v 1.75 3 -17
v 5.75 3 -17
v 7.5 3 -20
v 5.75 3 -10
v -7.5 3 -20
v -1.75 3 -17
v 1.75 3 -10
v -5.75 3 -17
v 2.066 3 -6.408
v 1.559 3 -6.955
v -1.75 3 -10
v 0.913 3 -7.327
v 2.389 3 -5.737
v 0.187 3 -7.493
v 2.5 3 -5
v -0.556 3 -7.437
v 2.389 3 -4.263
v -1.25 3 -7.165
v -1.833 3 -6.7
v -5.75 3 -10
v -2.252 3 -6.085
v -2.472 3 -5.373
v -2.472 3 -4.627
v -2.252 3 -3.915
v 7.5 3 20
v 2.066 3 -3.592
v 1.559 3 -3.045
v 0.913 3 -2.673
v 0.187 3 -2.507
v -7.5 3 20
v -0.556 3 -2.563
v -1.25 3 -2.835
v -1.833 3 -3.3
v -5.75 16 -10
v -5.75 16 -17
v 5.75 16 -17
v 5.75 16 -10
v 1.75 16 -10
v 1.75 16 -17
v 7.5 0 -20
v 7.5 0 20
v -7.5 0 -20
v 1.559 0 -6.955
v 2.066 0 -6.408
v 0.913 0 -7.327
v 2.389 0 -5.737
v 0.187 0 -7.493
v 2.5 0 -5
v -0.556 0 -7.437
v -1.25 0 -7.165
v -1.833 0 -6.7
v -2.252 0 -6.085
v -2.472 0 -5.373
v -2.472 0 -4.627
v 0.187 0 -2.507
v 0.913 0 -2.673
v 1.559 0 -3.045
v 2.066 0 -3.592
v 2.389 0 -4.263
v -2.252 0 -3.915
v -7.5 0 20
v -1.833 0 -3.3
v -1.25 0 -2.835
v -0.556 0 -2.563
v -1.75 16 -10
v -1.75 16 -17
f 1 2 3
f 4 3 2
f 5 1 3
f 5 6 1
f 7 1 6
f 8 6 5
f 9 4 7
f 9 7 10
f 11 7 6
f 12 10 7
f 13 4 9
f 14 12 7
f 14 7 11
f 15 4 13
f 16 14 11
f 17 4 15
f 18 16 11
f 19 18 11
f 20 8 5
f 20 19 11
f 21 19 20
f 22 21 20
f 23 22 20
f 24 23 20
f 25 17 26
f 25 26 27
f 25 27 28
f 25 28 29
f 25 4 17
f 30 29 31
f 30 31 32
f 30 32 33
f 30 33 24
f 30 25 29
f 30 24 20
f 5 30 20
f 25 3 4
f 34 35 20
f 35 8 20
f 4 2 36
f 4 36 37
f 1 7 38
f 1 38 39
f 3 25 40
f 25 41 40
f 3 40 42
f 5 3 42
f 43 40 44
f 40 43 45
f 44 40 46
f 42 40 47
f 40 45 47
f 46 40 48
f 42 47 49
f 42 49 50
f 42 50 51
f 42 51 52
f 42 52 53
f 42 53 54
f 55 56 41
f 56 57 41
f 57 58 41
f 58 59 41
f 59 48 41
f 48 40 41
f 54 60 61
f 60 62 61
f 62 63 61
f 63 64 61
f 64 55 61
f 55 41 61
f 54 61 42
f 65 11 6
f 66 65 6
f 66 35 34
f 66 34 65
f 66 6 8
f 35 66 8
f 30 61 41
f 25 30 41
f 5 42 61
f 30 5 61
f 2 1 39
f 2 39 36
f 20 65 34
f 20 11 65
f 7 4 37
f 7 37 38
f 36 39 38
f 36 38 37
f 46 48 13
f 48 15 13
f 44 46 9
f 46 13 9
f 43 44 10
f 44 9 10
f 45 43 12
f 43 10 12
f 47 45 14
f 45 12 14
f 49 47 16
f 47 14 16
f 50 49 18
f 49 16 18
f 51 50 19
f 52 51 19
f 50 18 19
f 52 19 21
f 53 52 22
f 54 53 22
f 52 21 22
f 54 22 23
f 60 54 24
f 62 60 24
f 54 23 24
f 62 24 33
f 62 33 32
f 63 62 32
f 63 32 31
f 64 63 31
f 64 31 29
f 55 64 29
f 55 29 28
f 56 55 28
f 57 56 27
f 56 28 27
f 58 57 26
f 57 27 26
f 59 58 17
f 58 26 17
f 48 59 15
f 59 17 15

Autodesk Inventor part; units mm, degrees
ref_plane "YZ Plane" through (0, 0, 0) normal (1, 0, 0) x (0, 1, 0)
ref_plane "XZ Plane" through (0, 0, 0) normal (0, 1, 0) x (-1, 0, 0)
ref_plane "XY Plane" through (0, 0, 0) normal (0, 0, 1) x (1, 0, 0)
sketch "Sketch1" plane through (0, 0, 0) normal (0, 1, 0) x (-1, 0, 0)
  line L0 (7.5, 20) -> (-7.5, 20)
  line L1 (-7.5, 20) -> (-7.5, -20)
  line L2 (-7.5, -20) -> (7.5, -20)
  line L3 (7.5, -20) -> (7.5, 20)
  line L4 (7.5, 20) -> (-7.5, -20) construction
  line L5 (-7.5, 20) -> (7.5, -20) construction
  point P0 (0, 0)
  dimension "d0" = 15
  dimension "d1" = 40
extrude "Extrusion1" add sketch "Sketch1" along normal blind 3
sketch "Sketch2" plane through (0, 3, 0) normal (0, 1, 0) x (1, 0, 0)
  line L0 (0, 0) -> (0, 5)
  circle A0 centre (0, 5) radius 2.5
  line L1 (0, 5) -> (0, 10)
  line L2 (0, 10) -> (-3.75, 10)
  line L3 (-3.75, 10) -> (-3.75, 13.5)
  line L4 (-5.75, 10) -> (-1.75, 10)
  line L5 (-1.75, 10) -> (-1.75, 17)
  line L6 (-1.75, 17) -> (-5.75, 17)
  line L7 (-5.75, 17) -> (-5.75, 10)
  line L8 (-5.75, 10) -> (-1.75, 17) construction
  line L9 (-1.75, 10) -> (-5.75, 17) construction
  line L10 (3.75, 10) -> (3.75, 13.5)
  line L11 (5.75, 10) -> (1.75, 10)
  line L12 (1.75, 10) -> (1.75, 17)
  line L13 (1.75, 17) -> (5.75, 17)
  line L14 (5.75, 17) -> (5.75, 10)
  line L15 (5.75, 10) -> (1.75, 17) construction
  line L16 (1.75, 10) -> (5.75, 17) construction
  dimension "d4" = 5
  dimension "d5" = 5
  dimension "d6" = 5
  dimension "d7" = 3.75
  dimension "d8" = 3.5
  dimension "d9" = 4
  dimension "d10" = 7
extrude "Extrusion2" add sketch "Sketch2" along normal blind 13 contours L2 L4 L7 L6 L5 | L11 L12 L13 L14
extrude "Extrusion3" cut sketch "Sketch2" against normal blind 13 contours A0 L1 L0 | L0 L1 A0
properties part number "KY 032 INFRERROJO"
